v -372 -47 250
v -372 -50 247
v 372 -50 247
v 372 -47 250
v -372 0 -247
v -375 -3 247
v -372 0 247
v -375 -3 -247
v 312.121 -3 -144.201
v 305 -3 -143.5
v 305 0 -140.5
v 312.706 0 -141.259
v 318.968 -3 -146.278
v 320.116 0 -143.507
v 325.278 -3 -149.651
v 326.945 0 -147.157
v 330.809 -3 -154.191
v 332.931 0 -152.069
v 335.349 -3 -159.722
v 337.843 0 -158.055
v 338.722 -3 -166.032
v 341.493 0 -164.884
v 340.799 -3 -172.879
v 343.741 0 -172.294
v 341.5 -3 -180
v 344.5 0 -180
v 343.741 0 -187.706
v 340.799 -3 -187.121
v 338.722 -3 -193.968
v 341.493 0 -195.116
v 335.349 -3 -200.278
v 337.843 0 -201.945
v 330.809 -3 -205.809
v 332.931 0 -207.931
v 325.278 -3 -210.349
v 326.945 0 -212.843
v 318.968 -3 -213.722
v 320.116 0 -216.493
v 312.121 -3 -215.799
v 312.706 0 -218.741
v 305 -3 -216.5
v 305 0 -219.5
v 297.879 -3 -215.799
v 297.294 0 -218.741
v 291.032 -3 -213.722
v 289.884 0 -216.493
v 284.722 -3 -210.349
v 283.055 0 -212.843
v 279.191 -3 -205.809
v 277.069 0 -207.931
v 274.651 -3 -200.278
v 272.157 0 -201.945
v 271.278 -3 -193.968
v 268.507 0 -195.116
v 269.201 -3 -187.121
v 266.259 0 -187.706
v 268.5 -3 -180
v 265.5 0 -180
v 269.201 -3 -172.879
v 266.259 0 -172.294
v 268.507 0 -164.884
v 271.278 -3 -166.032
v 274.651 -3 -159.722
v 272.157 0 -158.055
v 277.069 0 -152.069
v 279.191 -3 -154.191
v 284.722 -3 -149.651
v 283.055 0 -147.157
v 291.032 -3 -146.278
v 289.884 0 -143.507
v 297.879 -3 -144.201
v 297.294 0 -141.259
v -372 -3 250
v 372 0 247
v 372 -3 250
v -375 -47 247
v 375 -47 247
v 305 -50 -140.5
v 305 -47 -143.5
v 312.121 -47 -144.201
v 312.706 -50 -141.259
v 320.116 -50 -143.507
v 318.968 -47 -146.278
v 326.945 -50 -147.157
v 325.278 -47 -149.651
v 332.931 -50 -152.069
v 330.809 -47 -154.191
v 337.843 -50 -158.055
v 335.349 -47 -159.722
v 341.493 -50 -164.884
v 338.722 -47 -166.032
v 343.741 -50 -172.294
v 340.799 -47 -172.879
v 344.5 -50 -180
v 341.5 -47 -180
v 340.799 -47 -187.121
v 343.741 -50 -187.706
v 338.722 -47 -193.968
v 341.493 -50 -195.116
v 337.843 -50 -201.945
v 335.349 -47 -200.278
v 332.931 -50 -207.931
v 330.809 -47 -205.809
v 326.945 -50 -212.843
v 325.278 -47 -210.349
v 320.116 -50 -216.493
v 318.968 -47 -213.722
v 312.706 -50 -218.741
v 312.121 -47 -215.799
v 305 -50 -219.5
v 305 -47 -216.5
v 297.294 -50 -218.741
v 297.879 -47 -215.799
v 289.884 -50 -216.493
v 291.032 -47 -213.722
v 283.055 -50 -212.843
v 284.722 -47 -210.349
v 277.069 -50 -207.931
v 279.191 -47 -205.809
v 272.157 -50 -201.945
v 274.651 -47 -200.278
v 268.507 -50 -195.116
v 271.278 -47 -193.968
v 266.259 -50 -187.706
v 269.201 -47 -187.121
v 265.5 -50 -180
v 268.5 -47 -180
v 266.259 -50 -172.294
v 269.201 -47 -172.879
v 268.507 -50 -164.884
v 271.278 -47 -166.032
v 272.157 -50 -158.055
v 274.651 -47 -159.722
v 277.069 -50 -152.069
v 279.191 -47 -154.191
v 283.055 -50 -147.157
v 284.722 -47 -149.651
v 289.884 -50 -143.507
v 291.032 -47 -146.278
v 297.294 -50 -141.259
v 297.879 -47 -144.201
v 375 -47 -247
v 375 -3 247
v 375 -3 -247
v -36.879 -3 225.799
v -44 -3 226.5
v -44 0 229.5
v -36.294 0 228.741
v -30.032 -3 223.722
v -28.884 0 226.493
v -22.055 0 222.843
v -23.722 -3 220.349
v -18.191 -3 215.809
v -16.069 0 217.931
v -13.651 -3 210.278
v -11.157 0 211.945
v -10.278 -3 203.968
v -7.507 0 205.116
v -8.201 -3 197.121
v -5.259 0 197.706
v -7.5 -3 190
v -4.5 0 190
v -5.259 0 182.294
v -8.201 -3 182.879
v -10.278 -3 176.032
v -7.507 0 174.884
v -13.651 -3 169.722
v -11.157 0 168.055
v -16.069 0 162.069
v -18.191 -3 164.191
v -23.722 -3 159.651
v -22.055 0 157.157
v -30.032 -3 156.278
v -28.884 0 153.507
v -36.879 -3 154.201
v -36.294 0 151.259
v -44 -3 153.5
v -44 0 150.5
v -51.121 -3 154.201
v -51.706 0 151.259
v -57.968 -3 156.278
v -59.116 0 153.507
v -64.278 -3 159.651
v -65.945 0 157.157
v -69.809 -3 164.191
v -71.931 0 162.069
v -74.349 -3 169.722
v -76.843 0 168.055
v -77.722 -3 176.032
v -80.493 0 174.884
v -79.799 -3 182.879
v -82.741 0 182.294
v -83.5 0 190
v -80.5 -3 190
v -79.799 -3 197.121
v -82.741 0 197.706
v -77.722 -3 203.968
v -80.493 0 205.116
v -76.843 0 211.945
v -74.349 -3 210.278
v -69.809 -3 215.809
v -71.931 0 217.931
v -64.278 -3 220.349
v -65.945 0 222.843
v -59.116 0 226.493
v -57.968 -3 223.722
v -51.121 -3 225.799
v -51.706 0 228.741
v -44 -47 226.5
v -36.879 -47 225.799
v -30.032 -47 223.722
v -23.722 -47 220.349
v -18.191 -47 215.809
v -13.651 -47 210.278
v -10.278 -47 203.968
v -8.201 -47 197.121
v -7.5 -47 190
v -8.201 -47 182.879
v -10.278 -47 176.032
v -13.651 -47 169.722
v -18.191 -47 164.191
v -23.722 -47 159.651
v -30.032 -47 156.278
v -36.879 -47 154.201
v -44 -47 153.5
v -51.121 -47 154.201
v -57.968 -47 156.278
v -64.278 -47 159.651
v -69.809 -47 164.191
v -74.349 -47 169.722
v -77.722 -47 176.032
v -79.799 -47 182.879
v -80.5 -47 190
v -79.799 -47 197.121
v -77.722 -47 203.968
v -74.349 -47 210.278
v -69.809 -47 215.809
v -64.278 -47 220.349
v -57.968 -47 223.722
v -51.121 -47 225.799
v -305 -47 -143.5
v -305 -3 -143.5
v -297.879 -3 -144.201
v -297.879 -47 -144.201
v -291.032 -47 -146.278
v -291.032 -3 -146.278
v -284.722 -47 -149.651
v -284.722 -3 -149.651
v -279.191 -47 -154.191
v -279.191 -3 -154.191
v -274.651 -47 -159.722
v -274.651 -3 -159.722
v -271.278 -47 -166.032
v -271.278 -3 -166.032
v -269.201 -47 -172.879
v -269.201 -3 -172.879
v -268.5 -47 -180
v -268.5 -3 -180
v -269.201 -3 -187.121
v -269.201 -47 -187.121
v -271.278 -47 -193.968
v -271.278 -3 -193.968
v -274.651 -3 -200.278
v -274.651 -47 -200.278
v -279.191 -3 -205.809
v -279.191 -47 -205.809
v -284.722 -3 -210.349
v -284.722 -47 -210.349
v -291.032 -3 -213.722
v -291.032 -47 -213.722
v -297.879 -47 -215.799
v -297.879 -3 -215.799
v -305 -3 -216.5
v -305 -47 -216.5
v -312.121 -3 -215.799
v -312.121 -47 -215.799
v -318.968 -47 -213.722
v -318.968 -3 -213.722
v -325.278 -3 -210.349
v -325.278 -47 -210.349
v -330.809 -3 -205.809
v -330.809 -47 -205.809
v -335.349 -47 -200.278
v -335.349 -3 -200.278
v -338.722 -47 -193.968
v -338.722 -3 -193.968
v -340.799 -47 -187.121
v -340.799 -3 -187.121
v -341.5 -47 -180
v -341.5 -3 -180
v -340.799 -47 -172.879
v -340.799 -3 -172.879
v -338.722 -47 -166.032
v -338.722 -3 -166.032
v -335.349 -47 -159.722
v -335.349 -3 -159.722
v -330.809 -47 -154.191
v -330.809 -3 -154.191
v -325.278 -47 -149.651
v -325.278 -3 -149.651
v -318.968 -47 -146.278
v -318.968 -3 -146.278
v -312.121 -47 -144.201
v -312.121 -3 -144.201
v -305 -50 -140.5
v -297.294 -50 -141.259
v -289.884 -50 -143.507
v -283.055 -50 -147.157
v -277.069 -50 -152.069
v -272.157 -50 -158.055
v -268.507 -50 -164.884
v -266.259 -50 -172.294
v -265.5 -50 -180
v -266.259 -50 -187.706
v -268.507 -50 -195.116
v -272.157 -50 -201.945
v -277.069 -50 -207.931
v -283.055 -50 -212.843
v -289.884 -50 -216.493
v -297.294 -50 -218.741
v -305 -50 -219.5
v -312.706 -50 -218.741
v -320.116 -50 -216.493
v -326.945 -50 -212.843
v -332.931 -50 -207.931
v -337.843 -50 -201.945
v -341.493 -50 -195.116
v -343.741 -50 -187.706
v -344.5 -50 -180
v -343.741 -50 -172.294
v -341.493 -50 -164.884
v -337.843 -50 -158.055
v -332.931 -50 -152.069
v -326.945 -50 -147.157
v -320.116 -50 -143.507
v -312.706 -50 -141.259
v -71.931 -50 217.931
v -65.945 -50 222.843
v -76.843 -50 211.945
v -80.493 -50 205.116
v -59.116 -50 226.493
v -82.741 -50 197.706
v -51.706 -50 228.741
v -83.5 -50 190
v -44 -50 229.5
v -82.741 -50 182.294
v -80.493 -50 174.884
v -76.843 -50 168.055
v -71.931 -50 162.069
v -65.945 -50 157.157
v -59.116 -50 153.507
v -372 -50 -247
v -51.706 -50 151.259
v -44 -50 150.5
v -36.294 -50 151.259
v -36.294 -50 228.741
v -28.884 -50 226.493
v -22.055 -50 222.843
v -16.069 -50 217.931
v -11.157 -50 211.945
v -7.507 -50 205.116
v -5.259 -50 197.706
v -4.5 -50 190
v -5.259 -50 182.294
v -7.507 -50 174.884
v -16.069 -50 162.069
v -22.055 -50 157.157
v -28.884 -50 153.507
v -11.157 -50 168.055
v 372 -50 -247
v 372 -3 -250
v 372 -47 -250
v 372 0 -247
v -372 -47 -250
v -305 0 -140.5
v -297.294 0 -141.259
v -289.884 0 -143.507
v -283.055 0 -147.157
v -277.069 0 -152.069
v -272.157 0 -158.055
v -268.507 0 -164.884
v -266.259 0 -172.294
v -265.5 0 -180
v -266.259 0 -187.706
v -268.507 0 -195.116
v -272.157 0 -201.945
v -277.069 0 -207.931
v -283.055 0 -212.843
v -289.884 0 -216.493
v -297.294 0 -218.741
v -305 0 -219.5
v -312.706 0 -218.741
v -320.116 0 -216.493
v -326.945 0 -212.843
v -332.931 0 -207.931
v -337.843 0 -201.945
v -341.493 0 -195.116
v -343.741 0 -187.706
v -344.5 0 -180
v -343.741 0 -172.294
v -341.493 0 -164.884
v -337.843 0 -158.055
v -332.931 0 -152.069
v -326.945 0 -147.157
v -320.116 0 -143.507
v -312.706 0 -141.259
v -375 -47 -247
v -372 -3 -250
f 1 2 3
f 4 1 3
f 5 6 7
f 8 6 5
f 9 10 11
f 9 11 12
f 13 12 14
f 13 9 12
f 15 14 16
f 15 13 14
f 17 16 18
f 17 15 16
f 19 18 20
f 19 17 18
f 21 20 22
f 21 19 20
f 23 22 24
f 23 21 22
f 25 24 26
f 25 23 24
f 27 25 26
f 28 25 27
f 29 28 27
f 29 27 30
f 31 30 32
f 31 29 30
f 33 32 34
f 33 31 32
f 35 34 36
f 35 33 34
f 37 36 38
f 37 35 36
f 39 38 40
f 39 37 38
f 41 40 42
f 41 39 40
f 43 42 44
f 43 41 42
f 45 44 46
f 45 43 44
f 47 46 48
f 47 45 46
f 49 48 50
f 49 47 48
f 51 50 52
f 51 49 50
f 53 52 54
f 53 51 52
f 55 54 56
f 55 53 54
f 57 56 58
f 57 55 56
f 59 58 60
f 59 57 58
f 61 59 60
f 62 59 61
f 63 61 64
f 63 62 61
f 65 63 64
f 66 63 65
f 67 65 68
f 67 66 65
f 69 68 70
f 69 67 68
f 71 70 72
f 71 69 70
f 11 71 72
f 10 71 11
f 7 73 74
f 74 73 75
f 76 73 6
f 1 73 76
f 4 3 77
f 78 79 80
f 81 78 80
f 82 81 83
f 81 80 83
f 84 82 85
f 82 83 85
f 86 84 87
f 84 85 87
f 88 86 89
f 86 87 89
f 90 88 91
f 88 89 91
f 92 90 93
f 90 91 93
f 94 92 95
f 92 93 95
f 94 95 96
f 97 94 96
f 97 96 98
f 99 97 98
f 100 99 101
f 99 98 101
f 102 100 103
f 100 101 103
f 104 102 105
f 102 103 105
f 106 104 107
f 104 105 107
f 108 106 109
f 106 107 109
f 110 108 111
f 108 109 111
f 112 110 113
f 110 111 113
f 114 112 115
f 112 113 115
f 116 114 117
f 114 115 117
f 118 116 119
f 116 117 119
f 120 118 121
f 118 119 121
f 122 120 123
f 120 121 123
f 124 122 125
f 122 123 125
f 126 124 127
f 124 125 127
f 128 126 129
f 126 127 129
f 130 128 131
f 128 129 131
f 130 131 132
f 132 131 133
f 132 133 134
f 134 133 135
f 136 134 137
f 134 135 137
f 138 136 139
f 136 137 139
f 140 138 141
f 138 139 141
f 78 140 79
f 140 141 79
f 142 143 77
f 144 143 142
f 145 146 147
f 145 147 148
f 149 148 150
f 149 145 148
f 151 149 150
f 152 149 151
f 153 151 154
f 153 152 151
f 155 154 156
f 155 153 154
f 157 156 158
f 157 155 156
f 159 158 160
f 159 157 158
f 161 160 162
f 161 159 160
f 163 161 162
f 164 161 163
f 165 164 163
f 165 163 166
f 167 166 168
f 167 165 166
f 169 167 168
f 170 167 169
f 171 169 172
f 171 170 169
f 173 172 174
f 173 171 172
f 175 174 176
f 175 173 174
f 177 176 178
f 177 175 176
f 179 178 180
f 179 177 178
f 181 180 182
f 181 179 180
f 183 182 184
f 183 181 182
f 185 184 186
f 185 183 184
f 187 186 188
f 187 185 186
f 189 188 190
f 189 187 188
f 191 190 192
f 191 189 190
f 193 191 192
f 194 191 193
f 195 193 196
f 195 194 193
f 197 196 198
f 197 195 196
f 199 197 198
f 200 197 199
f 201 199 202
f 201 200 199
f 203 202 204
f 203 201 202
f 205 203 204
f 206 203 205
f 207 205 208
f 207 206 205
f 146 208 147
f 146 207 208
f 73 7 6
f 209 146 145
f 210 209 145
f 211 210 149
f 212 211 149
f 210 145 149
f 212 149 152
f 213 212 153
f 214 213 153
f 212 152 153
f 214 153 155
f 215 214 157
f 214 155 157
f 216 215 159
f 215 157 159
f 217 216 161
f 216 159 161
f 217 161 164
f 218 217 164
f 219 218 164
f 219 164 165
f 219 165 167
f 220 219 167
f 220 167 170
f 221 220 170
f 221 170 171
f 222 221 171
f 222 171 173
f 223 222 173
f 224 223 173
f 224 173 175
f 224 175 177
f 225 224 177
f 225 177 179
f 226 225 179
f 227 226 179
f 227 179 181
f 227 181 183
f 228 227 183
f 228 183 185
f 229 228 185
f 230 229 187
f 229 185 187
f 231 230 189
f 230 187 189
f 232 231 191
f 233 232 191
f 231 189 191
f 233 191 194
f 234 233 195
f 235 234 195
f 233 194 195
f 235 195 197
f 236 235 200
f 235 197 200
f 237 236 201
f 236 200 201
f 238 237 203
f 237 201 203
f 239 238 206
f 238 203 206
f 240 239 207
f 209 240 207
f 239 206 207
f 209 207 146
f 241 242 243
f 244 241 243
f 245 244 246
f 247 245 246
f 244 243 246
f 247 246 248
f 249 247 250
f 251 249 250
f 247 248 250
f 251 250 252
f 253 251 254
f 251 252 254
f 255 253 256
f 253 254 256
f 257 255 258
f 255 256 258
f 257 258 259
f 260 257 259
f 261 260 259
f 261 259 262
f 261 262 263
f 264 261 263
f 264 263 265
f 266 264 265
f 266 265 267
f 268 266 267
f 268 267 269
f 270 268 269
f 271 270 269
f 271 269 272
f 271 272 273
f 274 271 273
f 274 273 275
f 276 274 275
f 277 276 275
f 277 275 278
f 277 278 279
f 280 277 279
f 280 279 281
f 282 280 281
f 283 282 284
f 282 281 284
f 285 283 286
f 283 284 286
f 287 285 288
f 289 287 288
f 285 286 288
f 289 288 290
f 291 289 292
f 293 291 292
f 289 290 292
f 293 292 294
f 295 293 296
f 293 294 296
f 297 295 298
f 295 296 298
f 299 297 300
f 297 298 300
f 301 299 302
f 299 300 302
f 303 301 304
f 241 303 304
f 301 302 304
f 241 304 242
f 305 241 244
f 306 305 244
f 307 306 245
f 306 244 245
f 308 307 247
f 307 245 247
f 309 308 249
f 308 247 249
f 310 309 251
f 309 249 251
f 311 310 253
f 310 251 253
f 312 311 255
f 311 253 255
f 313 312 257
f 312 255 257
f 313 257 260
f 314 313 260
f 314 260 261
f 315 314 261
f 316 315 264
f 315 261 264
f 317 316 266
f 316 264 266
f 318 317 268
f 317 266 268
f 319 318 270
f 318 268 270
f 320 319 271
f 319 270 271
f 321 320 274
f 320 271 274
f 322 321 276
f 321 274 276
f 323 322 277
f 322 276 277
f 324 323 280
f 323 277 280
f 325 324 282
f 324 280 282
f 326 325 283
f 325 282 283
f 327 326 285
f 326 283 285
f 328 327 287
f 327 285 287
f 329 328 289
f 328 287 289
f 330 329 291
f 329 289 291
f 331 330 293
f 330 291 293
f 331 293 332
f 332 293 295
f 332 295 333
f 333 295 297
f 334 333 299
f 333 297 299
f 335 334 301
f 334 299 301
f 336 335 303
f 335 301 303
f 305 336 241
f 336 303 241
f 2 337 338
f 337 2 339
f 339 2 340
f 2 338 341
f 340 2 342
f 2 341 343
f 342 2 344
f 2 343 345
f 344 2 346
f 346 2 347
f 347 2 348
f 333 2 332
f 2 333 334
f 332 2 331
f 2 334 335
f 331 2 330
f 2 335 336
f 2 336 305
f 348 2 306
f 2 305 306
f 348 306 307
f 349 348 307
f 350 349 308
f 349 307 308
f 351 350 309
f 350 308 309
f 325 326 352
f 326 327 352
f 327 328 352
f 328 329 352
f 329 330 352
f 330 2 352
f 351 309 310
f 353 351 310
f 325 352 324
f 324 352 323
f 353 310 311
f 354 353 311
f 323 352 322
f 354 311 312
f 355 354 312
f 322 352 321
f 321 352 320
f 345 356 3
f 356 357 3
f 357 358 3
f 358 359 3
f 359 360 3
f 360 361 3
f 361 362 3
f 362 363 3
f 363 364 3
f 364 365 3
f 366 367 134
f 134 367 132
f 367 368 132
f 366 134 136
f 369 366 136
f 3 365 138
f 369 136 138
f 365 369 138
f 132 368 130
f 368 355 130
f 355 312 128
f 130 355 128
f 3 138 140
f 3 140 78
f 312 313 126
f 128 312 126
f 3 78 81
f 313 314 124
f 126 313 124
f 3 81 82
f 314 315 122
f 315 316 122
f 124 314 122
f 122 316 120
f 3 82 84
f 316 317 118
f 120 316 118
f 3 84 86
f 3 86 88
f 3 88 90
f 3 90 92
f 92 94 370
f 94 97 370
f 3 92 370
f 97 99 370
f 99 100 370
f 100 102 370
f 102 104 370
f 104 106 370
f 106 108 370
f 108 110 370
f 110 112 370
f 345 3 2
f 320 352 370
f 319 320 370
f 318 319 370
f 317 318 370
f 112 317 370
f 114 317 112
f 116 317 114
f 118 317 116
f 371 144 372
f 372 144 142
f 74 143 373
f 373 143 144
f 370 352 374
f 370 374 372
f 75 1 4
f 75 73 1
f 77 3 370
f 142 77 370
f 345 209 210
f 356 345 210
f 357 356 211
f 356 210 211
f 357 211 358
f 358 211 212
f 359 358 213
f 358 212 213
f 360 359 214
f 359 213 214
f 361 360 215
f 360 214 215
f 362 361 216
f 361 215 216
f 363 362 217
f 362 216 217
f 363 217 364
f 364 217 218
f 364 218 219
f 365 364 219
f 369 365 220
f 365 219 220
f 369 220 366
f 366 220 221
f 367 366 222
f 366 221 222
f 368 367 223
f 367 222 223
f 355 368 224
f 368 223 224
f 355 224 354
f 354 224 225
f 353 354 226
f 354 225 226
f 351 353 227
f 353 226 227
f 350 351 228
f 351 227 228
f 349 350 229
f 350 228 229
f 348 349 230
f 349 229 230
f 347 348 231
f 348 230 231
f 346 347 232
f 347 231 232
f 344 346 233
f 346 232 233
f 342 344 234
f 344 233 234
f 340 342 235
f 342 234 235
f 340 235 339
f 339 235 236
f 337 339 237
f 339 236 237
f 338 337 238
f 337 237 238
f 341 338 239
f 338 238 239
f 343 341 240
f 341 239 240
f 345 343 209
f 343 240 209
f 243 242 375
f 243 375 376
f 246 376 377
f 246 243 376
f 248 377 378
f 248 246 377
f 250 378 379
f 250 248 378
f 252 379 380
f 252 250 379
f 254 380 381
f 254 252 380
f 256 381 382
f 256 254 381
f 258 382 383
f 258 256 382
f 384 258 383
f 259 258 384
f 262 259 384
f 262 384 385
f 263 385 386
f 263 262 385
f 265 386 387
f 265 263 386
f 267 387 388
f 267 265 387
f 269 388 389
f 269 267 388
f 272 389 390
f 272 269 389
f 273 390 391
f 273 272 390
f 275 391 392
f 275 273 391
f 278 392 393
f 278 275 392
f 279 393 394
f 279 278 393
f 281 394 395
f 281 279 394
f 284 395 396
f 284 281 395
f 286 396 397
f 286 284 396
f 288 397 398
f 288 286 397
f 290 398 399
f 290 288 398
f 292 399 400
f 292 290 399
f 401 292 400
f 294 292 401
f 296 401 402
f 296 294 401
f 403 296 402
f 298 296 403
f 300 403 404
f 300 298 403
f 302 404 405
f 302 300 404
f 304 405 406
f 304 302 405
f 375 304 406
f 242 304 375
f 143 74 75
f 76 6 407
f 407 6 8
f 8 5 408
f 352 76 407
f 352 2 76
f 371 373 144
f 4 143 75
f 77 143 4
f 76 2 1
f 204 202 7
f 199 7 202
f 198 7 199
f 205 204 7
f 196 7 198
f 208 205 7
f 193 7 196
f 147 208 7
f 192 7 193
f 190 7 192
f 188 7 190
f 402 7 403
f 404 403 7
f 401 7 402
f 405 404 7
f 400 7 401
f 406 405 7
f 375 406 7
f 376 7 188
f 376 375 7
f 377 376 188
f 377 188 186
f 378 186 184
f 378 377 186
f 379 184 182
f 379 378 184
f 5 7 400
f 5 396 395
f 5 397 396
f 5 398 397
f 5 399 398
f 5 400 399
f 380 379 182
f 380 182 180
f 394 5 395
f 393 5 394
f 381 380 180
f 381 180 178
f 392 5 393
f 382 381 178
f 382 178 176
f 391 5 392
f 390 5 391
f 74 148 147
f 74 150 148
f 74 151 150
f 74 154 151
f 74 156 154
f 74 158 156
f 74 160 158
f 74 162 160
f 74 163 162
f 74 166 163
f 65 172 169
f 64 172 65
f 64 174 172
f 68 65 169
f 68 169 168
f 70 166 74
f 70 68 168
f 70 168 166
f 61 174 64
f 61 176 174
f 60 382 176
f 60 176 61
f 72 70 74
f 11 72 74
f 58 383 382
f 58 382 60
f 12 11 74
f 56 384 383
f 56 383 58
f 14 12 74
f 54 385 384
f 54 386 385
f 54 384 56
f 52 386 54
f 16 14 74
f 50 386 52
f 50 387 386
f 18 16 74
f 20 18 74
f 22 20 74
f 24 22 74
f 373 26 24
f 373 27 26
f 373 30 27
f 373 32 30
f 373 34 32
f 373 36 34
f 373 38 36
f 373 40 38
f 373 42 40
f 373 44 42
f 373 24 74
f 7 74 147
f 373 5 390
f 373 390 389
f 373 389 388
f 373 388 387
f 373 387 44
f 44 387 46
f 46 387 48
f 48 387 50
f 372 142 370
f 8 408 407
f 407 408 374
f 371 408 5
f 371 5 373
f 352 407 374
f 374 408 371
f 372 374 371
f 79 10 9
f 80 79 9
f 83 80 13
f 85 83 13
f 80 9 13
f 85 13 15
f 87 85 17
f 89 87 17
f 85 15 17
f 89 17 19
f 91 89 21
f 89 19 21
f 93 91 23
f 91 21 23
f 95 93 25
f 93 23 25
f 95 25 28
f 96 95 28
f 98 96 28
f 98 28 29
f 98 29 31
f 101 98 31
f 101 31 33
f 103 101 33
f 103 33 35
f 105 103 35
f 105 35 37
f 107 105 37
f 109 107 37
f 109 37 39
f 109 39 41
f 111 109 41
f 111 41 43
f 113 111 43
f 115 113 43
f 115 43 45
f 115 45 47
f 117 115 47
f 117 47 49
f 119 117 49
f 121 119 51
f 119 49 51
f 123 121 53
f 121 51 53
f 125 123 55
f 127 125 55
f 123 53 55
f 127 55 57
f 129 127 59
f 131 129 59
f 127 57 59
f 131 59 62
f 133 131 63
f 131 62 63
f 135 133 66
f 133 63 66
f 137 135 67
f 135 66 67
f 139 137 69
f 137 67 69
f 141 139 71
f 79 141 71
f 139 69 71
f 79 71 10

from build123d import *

# Parameters (mm, degrees)
SKETCH1_W           = 750
SKETCH1_H           = 500
BOSS_EXTRUDE1_DEPTH = 50
CUT_EXTRUDE1_REACH  = 455.459
SKETCH2_R           = 36.5
CHAMFER1_SIZE       = 3
CHAMFER2_SIZE       = 3


with BuildPart() as part:
    # Sketch1 → Boss-Extrude1 (new body)
    with BuildSketch(Plane(origin=(0, 0, 0), x_dir=(1, 0, 0), z_dir=(0, 1, 0))):
        Rectangle(SKETCH1_W, SKETCH1_H)
    extrude(amount=-BOSS_EXTRUDE1_DEPTH)

    # Sketch2 → Cut-Extrude1 (cut, up to next)
    with BuildSketch(Plane(origin=(0, 0, 0), x_dir=(1, 0, 0), z_dir=(0, 1, 0)), mode=Mode.PRIVATE) as cut_extrude1_sk1:
        with Locations(Location((-305, 180, 0), (0, 0, 270))):
            Circle(SKETCH2_R)
    cut_extrude1_tool1 = extrude(cut_extrude1_sk1.sketch, amount=-CUT_EXTRUDE1_REACH, mode=Mode.PRIVATE) & part.part
    # Sketch2 → Cut-Extrude1 (cut, up to next)
    with BuildSketch(Plane(origin=(0, 0, 0), x_dir=(1, 0, 0), z_dir=(0, 1, 0)), mode=Mode.PRIVATE) as cut_extrude1_sk2:
        with Locations(Location((305, 180, 0), (0, 0, 270))):
            Circle(SKETCH2_R)
    cut_extrude1_tool2 = extrude(cut_extrude1_sk2.sketch, amount=-CUT_EXTRUDE1_REACH, mode=Mode.PRIVATE) & part.part
    # Sketch2 → Cut-Extrude1 (cut, up to next)
    with BuildSketch(Plane(origin=(0, 0, 0), x_dir=(1, 0, 0), z_dir=(0, 1, 0)), mode=Mode.PRIVATE) as cut_extrude1_sk3:
        with Locations(Location((-44, -190, 0), (0, 0, 270))):
            Circle(SKETCH2_R)
    cut_extrude1_tool3 = extrude(cut_extrude1_sk3.sketch, amount=-CUT_EXTRUDE1_REACH, mode=Mode.PRIVATE) & part.part
    add(cut_extrude1_tool1.solids().sort_by_distance((-305, 0, -180))[0], mode=Mode.SUBTRACT)
    add(cut_extrude1_tool2.solids().sort_by_distance((305, 0, -180))[0], mode=Mode.SUBTRACT)
    add(cut_extrude1_tool3.solids().sort_by_distance((-44, 0, 190))[0], mode=Mode.SUBTRACT)

    # Chamfer1
    chamfer1_edges = [part.edges().sort_by_distance(p)[0] for p in [
        (-305, -50, -216.5),
        (-305, 0, -216.5),
        (305, -50, -216.5),
        (305, 0, -216.5),
        (-44, -50, 153.5),
        (-44, 0, 153.5),
    ]]
    chamfer(chamfer1_edges, length=CHAMFER1_SIZE)

    # Chamfer2
    chamfer2_edges = [part.edges().sort_by_distance(p)[0] for p in [
        (-375, -50, 0),
        (0, -50, 250),
        (375, -50, 0),
        (0, 0, 250),
        (-375, 0, 0),
        (0, 0, -250),
        (375, 0, 0),
        (375, -25, 250),
        (-375, -25, 250),
        (-375, -25, -250),
        (375, -25, -250),
        (0, -50, -250),
    ]]
    chamfer(chamfer2_edges, length=CHAMFER2_SIZE)


solid = part.part
